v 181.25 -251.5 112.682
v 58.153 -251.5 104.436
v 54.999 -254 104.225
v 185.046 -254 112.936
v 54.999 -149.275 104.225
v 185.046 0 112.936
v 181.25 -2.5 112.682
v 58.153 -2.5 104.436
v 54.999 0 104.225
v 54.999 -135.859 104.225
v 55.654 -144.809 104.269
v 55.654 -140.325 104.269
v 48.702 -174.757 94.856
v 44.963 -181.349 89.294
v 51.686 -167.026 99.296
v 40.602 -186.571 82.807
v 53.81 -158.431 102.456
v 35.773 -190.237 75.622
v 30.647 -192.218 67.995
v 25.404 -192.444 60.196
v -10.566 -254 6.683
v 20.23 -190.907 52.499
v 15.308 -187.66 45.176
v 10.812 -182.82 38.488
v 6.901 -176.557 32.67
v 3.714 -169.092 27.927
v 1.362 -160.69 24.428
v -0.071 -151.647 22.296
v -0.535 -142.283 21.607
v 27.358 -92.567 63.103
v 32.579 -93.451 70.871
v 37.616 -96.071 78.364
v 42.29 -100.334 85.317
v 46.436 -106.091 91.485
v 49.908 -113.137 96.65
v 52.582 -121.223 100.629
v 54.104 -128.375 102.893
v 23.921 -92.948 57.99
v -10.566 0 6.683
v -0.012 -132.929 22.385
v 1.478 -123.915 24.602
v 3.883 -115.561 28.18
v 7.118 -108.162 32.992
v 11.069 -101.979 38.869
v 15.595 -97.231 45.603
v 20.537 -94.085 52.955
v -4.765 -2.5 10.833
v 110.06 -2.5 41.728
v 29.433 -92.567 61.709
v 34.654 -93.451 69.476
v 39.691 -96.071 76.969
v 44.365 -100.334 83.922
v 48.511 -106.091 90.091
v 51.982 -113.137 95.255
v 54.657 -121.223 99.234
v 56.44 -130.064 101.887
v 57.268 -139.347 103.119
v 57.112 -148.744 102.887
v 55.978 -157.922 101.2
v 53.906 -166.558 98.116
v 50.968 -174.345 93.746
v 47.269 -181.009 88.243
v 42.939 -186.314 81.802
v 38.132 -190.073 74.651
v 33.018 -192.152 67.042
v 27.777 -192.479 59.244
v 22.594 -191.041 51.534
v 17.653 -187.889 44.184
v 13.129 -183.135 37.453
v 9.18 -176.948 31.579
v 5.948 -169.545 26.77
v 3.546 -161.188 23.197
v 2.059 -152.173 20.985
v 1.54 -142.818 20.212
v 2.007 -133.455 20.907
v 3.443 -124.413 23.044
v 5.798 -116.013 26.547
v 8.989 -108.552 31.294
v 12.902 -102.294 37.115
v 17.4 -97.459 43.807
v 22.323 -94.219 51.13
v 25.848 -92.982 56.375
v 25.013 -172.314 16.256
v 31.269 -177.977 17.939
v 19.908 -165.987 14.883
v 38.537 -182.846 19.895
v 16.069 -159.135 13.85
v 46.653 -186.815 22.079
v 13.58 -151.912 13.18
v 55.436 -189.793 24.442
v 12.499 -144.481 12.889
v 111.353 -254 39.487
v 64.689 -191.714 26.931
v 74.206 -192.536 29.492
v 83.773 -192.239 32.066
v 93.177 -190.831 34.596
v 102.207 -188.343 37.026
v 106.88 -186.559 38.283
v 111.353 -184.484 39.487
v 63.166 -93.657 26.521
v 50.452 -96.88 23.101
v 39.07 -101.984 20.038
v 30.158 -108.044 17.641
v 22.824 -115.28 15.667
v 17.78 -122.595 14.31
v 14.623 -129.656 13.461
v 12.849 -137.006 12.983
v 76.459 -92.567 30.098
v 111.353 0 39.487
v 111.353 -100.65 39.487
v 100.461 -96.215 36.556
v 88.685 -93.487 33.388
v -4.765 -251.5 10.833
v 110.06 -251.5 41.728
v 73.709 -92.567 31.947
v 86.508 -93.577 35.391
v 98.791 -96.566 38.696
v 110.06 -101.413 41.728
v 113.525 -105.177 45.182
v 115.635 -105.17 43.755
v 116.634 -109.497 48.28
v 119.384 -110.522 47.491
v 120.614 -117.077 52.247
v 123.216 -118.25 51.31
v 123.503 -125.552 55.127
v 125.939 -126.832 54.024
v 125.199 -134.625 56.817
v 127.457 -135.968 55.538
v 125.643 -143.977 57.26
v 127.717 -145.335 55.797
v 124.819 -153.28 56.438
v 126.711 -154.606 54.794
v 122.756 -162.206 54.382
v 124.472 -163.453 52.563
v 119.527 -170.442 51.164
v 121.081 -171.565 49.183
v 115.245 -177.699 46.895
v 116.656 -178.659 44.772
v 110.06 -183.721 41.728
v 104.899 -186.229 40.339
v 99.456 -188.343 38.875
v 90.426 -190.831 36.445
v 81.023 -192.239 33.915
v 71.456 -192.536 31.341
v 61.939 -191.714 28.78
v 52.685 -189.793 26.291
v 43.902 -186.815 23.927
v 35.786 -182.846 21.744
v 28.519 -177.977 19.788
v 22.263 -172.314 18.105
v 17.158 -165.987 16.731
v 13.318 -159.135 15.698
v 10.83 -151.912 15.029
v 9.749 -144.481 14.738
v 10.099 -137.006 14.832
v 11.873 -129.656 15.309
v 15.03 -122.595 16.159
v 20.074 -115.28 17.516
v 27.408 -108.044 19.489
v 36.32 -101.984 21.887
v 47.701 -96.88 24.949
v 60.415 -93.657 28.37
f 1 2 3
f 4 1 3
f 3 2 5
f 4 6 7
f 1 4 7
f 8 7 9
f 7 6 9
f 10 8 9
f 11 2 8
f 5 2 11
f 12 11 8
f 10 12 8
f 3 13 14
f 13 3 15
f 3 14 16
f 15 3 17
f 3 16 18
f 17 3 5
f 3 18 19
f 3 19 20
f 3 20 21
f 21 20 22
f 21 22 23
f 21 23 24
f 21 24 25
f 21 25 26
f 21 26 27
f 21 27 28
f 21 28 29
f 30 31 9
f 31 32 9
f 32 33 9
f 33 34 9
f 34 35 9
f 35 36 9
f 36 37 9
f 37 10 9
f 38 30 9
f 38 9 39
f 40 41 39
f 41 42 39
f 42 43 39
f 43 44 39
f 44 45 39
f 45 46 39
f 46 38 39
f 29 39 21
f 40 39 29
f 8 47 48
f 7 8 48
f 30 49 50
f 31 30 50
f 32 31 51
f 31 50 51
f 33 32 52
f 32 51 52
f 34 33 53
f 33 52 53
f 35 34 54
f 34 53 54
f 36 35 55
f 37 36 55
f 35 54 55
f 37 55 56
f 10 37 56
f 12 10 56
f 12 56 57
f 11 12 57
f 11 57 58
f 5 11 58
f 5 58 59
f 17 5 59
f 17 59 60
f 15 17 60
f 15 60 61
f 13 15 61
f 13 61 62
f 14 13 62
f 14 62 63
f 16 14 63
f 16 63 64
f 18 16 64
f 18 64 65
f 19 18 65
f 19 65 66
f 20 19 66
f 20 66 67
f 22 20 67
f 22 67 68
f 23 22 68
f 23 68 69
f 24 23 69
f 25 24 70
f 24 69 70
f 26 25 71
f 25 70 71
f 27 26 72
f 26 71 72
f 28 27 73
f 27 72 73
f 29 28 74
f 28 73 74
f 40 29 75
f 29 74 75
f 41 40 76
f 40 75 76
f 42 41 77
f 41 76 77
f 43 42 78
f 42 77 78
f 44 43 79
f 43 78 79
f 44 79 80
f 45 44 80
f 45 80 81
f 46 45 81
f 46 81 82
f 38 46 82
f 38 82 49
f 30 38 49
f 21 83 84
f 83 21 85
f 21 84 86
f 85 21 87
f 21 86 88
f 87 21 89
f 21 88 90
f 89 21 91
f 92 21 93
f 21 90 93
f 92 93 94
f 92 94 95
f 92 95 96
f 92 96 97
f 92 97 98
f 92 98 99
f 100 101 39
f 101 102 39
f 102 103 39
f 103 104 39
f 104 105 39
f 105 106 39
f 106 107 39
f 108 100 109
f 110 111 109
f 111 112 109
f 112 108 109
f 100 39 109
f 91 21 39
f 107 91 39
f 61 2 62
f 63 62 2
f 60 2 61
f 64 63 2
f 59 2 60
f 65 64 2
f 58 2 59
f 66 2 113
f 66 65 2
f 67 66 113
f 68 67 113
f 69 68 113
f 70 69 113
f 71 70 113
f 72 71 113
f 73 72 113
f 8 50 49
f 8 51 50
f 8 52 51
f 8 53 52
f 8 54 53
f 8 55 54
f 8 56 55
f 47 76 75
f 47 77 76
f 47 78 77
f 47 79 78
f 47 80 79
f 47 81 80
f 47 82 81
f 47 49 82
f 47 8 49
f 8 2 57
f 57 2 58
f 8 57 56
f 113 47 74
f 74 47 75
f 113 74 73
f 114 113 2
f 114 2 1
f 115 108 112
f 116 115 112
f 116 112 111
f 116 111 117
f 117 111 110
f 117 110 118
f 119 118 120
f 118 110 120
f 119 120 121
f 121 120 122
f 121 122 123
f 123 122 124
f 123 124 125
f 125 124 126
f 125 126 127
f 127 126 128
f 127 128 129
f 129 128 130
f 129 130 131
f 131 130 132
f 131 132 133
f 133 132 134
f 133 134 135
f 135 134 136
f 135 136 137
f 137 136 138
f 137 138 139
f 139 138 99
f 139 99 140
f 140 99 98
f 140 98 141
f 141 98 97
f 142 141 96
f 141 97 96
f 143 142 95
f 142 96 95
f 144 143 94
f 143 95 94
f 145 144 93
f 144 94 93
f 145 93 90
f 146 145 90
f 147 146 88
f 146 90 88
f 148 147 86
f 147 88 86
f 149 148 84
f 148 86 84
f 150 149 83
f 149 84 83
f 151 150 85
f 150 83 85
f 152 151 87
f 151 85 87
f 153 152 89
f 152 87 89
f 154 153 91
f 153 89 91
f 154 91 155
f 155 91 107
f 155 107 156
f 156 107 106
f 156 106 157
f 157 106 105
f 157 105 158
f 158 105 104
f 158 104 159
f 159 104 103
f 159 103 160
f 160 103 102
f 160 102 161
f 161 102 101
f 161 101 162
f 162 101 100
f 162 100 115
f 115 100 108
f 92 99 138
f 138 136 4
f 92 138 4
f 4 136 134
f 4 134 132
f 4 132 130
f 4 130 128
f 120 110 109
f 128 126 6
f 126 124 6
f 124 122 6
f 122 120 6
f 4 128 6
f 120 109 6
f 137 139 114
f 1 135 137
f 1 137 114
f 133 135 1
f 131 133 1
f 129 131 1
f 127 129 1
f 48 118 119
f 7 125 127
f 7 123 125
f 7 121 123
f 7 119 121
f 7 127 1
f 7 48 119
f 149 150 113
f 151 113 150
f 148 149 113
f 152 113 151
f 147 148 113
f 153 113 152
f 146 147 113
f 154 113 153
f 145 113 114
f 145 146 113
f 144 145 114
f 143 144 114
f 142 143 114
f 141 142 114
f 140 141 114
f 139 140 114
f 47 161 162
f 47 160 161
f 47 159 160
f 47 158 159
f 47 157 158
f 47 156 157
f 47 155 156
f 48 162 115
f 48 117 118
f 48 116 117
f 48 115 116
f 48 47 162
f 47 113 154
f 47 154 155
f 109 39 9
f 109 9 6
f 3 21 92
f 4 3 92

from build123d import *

# Parameters (mm, degrees)
F1_DEPTH = 254
F2_T     = -2.5
F4_D     = 100


with BuildPart() as f1:
    # F0 (on Front) → F1 (new body)
    with BuildSketch(Plane.XZ):
        Polygon((-10.566324, 6.683148), (111.352801, 39.486691), (185.046107, 112.936161), (54.999065, 104.22466), align=None)
    extrude(amount=F1_DEPTH)

    # F2
    f2_openings = [f1.faces().sort_by_distance(p)[0] for p in [
        (120.022586, -127, 108.58041),
    ]]
    offset(amount=F2_T, openings=f2_openings)

    # F4 (through all)
    with Locations(Plane(origin=(-10.372185, 0, 6.971968), x_dir=(0, -1, 0), z_dir=(-0.829933, 0, 0.557864))):
        with Locations((142.56683, 67.633435)):
            Hole(F4_D / 2)


solid = f1.part
